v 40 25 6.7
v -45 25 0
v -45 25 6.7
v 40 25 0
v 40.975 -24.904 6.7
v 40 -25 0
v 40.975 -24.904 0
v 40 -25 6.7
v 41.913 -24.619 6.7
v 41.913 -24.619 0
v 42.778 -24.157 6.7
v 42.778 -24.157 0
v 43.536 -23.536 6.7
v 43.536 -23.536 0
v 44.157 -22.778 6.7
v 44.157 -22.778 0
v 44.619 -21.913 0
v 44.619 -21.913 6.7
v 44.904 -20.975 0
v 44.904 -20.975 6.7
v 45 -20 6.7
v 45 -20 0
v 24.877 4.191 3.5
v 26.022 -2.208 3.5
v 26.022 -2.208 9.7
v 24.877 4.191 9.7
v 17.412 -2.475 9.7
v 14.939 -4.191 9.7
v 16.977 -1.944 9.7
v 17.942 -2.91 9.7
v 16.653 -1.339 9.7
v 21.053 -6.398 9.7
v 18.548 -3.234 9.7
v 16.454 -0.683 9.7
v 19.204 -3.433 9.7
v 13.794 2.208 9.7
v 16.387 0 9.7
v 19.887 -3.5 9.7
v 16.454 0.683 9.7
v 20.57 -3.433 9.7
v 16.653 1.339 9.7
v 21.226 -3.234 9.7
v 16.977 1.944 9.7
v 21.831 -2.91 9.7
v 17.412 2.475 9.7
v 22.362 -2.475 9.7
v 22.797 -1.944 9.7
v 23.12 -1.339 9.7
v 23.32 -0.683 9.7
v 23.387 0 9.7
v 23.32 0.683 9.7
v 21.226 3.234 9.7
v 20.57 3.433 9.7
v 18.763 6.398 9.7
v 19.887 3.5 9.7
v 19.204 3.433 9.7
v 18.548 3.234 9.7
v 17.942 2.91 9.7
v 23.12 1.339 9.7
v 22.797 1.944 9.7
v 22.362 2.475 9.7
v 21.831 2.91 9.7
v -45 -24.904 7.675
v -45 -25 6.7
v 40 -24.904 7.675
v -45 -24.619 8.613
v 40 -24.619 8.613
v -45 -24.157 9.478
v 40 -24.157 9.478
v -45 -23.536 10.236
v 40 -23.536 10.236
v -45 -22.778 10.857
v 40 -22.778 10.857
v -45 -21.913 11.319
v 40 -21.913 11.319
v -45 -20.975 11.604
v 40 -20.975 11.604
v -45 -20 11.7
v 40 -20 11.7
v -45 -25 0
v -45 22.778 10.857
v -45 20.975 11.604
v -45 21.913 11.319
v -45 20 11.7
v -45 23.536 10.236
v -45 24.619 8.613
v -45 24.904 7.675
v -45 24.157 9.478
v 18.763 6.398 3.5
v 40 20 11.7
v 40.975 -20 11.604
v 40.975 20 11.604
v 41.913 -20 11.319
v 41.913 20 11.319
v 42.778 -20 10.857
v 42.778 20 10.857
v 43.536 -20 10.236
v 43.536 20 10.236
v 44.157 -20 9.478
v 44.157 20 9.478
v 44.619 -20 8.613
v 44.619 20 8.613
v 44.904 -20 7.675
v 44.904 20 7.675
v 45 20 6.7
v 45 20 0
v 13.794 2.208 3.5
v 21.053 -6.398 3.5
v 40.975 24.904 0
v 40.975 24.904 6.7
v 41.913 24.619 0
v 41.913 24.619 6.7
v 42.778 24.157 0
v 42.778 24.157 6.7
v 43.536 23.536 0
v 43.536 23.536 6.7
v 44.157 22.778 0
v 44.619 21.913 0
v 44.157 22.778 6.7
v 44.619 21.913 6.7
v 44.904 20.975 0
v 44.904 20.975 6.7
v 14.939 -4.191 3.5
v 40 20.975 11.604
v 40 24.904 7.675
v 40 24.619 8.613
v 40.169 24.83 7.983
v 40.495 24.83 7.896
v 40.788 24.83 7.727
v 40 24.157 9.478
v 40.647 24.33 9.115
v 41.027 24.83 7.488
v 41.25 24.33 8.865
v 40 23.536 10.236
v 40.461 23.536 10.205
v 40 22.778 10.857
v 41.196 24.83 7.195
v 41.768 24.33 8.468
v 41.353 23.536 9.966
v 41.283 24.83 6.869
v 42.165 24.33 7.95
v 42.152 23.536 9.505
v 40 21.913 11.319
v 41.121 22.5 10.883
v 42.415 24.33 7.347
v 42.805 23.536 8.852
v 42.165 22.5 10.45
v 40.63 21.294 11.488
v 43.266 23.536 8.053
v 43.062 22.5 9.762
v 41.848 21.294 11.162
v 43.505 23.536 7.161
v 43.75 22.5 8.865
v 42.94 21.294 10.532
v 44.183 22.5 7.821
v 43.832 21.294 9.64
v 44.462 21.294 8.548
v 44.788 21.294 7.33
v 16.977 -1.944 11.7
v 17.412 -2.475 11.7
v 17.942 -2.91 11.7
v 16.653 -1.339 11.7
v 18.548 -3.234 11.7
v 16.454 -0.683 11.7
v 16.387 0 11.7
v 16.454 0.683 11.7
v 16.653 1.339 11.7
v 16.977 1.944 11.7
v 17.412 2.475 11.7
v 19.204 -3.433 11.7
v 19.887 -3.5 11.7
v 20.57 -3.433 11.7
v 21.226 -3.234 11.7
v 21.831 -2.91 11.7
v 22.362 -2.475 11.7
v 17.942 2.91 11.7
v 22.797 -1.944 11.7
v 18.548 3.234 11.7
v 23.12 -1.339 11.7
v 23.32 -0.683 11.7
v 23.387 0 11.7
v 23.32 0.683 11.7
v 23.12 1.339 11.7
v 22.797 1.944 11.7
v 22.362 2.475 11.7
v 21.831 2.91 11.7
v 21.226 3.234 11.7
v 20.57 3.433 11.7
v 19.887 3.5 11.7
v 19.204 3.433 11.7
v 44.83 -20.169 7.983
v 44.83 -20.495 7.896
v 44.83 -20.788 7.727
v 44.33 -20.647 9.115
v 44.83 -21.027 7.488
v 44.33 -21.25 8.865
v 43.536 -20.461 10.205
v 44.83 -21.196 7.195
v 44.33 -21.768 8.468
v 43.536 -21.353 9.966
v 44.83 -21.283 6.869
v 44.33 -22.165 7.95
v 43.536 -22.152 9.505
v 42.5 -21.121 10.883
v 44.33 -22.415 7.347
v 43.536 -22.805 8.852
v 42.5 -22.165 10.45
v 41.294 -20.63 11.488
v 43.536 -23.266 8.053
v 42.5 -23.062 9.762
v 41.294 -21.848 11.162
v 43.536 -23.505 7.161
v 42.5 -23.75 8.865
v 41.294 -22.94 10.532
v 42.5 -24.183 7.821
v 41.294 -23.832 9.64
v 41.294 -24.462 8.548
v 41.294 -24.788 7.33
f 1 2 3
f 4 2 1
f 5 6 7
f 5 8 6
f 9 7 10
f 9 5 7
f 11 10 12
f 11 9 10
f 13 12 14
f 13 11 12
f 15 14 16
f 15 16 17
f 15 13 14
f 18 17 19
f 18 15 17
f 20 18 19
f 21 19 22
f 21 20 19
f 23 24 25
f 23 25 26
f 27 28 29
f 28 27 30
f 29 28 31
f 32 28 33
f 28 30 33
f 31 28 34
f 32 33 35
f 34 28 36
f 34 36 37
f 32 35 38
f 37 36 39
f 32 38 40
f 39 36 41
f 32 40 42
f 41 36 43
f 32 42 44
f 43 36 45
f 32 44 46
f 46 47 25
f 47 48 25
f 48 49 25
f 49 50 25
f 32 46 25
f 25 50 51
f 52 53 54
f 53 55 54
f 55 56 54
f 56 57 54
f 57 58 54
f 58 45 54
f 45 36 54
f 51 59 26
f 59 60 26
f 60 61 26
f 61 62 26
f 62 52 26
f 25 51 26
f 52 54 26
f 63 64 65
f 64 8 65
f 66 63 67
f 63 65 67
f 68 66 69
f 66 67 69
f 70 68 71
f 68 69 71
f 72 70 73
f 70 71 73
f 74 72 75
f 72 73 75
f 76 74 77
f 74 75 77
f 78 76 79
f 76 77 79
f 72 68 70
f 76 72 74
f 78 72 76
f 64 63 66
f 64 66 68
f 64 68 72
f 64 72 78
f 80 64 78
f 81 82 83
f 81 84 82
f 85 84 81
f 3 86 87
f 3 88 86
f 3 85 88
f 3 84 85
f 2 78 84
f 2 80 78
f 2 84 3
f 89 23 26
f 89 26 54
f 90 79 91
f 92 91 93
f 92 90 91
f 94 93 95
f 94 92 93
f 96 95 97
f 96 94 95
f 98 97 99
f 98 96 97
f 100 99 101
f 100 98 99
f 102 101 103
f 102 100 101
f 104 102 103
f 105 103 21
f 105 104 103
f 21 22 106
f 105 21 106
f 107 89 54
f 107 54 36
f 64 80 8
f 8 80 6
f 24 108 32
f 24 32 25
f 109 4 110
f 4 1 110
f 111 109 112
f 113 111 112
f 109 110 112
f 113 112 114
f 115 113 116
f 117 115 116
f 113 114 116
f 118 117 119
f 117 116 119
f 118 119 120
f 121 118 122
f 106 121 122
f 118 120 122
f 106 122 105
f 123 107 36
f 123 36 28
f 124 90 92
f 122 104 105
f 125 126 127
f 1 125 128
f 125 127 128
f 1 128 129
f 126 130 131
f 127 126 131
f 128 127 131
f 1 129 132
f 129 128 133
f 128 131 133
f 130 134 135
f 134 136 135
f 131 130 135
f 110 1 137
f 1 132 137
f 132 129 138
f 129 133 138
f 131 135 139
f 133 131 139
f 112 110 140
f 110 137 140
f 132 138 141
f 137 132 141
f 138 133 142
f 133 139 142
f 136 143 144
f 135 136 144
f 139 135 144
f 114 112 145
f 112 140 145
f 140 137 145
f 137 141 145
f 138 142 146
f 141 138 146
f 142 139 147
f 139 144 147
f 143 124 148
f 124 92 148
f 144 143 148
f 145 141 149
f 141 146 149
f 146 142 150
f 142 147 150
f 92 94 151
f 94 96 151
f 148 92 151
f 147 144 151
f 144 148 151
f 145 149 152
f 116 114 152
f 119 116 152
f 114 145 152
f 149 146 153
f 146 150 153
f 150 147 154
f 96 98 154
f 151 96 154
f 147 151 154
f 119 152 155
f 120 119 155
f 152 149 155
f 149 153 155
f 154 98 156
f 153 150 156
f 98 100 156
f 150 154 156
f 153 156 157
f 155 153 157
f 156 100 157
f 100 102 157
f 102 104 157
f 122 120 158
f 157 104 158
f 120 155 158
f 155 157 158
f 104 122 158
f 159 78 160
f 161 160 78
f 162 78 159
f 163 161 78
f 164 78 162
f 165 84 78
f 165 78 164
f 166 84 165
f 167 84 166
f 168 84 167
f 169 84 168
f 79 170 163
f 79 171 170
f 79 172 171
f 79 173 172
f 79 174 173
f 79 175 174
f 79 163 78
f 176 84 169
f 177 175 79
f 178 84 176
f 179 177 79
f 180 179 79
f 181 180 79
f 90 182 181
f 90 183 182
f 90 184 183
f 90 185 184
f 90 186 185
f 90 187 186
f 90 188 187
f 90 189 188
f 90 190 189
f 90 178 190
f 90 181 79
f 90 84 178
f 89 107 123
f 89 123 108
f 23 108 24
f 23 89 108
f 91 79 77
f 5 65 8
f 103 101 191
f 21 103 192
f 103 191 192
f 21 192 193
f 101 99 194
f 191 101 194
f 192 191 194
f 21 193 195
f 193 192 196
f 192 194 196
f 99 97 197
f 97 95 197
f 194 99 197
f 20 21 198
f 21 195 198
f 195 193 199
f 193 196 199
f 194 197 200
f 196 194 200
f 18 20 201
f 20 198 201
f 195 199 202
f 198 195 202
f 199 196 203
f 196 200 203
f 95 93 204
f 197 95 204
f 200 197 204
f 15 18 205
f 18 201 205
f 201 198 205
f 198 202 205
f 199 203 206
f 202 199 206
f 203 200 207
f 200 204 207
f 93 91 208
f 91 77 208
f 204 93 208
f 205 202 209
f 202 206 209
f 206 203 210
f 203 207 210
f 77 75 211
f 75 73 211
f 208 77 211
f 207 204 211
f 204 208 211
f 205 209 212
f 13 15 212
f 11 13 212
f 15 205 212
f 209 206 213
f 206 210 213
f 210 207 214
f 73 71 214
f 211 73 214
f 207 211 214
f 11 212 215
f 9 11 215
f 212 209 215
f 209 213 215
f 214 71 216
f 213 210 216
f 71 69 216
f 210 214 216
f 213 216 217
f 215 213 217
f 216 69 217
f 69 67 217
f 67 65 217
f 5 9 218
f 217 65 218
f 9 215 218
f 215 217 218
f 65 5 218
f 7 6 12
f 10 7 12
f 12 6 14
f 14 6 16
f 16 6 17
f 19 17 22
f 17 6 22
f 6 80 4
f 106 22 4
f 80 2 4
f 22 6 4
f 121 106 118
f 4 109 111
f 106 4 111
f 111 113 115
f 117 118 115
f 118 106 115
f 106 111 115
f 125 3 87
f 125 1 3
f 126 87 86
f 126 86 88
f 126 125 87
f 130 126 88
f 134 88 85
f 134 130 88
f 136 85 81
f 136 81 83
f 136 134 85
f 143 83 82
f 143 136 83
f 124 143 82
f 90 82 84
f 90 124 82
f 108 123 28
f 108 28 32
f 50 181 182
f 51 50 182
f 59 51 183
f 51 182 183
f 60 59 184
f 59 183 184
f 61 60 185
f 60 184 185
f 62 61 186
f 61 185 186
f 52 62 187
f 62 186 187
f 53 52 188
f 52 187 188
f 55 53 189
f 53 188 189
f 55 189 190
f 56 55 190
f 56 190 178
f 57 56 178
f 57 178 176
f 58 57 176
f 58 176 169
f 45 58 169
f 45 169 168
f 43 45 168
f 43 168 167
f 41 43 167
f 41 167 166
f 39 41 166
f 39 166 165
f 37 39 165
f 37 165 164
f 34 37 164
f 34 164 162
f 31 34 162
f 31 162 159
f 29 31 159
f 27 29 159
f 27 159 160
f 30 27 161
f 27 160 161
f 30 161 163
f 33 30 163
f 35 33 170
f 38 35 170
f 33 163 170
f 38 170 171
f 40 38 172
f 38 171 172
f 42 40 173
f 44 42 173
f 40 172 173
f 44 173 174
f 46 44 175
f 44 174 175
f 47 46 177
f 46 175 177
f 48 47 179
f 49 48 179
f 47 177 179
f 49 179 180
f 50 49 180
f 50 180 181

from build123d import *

# Parameters (mm, degrees)
F0_W     = 90
F0_H     = 50
F1_DEPTH = 11.7
F3_R     = 3.5
F4_DEPTH = 8.2
F7_DEPTH = 6.2
F8_R     = 5


with BuildPart() as f1:
    # F0 (on Top) → F1 (new body)
    with BuildSketch(Plane.XY):
        Rectangle(F0_W, F0_H)
    extrude(amount=F1_DEPTH)

    # F3 (on face) → F4 (cut)
    with BuildSketch(Plane.XY.offset(11.7)):
        with Locations((19.886918, 0)):
            Circle(F3_R)
    extrude(amount=-F4_DEPTH, mode=Mode.SUBTRACT)

    # F6 (on offset) → F7 (cut)
    with BuildSketch(Plane.XY.offset(3.5)):
        Polygon((24.876553, 4.19079), (18.762908, 6.398354), (13.794278, 2.207565), (14.939294, -4.19079), (21.052939, -6.398354), (26.021569, -2.207565), align=None)
    extrude(amount=F7_DEPTH, mode=Mode.SUBTRACT)

    # F8
    f8_edges = [f1.edges().sort_by_distance(p)[0] for p in [
        (0, -25, 11.7),
        (45, 0, 11.7),
        (0, 25, 11.7),
        (45, -25, 5.85),
        (45, 25, 5.85),
    ]]
    fillet(f8_edges, radius=F8_R)


solid = f1.part
